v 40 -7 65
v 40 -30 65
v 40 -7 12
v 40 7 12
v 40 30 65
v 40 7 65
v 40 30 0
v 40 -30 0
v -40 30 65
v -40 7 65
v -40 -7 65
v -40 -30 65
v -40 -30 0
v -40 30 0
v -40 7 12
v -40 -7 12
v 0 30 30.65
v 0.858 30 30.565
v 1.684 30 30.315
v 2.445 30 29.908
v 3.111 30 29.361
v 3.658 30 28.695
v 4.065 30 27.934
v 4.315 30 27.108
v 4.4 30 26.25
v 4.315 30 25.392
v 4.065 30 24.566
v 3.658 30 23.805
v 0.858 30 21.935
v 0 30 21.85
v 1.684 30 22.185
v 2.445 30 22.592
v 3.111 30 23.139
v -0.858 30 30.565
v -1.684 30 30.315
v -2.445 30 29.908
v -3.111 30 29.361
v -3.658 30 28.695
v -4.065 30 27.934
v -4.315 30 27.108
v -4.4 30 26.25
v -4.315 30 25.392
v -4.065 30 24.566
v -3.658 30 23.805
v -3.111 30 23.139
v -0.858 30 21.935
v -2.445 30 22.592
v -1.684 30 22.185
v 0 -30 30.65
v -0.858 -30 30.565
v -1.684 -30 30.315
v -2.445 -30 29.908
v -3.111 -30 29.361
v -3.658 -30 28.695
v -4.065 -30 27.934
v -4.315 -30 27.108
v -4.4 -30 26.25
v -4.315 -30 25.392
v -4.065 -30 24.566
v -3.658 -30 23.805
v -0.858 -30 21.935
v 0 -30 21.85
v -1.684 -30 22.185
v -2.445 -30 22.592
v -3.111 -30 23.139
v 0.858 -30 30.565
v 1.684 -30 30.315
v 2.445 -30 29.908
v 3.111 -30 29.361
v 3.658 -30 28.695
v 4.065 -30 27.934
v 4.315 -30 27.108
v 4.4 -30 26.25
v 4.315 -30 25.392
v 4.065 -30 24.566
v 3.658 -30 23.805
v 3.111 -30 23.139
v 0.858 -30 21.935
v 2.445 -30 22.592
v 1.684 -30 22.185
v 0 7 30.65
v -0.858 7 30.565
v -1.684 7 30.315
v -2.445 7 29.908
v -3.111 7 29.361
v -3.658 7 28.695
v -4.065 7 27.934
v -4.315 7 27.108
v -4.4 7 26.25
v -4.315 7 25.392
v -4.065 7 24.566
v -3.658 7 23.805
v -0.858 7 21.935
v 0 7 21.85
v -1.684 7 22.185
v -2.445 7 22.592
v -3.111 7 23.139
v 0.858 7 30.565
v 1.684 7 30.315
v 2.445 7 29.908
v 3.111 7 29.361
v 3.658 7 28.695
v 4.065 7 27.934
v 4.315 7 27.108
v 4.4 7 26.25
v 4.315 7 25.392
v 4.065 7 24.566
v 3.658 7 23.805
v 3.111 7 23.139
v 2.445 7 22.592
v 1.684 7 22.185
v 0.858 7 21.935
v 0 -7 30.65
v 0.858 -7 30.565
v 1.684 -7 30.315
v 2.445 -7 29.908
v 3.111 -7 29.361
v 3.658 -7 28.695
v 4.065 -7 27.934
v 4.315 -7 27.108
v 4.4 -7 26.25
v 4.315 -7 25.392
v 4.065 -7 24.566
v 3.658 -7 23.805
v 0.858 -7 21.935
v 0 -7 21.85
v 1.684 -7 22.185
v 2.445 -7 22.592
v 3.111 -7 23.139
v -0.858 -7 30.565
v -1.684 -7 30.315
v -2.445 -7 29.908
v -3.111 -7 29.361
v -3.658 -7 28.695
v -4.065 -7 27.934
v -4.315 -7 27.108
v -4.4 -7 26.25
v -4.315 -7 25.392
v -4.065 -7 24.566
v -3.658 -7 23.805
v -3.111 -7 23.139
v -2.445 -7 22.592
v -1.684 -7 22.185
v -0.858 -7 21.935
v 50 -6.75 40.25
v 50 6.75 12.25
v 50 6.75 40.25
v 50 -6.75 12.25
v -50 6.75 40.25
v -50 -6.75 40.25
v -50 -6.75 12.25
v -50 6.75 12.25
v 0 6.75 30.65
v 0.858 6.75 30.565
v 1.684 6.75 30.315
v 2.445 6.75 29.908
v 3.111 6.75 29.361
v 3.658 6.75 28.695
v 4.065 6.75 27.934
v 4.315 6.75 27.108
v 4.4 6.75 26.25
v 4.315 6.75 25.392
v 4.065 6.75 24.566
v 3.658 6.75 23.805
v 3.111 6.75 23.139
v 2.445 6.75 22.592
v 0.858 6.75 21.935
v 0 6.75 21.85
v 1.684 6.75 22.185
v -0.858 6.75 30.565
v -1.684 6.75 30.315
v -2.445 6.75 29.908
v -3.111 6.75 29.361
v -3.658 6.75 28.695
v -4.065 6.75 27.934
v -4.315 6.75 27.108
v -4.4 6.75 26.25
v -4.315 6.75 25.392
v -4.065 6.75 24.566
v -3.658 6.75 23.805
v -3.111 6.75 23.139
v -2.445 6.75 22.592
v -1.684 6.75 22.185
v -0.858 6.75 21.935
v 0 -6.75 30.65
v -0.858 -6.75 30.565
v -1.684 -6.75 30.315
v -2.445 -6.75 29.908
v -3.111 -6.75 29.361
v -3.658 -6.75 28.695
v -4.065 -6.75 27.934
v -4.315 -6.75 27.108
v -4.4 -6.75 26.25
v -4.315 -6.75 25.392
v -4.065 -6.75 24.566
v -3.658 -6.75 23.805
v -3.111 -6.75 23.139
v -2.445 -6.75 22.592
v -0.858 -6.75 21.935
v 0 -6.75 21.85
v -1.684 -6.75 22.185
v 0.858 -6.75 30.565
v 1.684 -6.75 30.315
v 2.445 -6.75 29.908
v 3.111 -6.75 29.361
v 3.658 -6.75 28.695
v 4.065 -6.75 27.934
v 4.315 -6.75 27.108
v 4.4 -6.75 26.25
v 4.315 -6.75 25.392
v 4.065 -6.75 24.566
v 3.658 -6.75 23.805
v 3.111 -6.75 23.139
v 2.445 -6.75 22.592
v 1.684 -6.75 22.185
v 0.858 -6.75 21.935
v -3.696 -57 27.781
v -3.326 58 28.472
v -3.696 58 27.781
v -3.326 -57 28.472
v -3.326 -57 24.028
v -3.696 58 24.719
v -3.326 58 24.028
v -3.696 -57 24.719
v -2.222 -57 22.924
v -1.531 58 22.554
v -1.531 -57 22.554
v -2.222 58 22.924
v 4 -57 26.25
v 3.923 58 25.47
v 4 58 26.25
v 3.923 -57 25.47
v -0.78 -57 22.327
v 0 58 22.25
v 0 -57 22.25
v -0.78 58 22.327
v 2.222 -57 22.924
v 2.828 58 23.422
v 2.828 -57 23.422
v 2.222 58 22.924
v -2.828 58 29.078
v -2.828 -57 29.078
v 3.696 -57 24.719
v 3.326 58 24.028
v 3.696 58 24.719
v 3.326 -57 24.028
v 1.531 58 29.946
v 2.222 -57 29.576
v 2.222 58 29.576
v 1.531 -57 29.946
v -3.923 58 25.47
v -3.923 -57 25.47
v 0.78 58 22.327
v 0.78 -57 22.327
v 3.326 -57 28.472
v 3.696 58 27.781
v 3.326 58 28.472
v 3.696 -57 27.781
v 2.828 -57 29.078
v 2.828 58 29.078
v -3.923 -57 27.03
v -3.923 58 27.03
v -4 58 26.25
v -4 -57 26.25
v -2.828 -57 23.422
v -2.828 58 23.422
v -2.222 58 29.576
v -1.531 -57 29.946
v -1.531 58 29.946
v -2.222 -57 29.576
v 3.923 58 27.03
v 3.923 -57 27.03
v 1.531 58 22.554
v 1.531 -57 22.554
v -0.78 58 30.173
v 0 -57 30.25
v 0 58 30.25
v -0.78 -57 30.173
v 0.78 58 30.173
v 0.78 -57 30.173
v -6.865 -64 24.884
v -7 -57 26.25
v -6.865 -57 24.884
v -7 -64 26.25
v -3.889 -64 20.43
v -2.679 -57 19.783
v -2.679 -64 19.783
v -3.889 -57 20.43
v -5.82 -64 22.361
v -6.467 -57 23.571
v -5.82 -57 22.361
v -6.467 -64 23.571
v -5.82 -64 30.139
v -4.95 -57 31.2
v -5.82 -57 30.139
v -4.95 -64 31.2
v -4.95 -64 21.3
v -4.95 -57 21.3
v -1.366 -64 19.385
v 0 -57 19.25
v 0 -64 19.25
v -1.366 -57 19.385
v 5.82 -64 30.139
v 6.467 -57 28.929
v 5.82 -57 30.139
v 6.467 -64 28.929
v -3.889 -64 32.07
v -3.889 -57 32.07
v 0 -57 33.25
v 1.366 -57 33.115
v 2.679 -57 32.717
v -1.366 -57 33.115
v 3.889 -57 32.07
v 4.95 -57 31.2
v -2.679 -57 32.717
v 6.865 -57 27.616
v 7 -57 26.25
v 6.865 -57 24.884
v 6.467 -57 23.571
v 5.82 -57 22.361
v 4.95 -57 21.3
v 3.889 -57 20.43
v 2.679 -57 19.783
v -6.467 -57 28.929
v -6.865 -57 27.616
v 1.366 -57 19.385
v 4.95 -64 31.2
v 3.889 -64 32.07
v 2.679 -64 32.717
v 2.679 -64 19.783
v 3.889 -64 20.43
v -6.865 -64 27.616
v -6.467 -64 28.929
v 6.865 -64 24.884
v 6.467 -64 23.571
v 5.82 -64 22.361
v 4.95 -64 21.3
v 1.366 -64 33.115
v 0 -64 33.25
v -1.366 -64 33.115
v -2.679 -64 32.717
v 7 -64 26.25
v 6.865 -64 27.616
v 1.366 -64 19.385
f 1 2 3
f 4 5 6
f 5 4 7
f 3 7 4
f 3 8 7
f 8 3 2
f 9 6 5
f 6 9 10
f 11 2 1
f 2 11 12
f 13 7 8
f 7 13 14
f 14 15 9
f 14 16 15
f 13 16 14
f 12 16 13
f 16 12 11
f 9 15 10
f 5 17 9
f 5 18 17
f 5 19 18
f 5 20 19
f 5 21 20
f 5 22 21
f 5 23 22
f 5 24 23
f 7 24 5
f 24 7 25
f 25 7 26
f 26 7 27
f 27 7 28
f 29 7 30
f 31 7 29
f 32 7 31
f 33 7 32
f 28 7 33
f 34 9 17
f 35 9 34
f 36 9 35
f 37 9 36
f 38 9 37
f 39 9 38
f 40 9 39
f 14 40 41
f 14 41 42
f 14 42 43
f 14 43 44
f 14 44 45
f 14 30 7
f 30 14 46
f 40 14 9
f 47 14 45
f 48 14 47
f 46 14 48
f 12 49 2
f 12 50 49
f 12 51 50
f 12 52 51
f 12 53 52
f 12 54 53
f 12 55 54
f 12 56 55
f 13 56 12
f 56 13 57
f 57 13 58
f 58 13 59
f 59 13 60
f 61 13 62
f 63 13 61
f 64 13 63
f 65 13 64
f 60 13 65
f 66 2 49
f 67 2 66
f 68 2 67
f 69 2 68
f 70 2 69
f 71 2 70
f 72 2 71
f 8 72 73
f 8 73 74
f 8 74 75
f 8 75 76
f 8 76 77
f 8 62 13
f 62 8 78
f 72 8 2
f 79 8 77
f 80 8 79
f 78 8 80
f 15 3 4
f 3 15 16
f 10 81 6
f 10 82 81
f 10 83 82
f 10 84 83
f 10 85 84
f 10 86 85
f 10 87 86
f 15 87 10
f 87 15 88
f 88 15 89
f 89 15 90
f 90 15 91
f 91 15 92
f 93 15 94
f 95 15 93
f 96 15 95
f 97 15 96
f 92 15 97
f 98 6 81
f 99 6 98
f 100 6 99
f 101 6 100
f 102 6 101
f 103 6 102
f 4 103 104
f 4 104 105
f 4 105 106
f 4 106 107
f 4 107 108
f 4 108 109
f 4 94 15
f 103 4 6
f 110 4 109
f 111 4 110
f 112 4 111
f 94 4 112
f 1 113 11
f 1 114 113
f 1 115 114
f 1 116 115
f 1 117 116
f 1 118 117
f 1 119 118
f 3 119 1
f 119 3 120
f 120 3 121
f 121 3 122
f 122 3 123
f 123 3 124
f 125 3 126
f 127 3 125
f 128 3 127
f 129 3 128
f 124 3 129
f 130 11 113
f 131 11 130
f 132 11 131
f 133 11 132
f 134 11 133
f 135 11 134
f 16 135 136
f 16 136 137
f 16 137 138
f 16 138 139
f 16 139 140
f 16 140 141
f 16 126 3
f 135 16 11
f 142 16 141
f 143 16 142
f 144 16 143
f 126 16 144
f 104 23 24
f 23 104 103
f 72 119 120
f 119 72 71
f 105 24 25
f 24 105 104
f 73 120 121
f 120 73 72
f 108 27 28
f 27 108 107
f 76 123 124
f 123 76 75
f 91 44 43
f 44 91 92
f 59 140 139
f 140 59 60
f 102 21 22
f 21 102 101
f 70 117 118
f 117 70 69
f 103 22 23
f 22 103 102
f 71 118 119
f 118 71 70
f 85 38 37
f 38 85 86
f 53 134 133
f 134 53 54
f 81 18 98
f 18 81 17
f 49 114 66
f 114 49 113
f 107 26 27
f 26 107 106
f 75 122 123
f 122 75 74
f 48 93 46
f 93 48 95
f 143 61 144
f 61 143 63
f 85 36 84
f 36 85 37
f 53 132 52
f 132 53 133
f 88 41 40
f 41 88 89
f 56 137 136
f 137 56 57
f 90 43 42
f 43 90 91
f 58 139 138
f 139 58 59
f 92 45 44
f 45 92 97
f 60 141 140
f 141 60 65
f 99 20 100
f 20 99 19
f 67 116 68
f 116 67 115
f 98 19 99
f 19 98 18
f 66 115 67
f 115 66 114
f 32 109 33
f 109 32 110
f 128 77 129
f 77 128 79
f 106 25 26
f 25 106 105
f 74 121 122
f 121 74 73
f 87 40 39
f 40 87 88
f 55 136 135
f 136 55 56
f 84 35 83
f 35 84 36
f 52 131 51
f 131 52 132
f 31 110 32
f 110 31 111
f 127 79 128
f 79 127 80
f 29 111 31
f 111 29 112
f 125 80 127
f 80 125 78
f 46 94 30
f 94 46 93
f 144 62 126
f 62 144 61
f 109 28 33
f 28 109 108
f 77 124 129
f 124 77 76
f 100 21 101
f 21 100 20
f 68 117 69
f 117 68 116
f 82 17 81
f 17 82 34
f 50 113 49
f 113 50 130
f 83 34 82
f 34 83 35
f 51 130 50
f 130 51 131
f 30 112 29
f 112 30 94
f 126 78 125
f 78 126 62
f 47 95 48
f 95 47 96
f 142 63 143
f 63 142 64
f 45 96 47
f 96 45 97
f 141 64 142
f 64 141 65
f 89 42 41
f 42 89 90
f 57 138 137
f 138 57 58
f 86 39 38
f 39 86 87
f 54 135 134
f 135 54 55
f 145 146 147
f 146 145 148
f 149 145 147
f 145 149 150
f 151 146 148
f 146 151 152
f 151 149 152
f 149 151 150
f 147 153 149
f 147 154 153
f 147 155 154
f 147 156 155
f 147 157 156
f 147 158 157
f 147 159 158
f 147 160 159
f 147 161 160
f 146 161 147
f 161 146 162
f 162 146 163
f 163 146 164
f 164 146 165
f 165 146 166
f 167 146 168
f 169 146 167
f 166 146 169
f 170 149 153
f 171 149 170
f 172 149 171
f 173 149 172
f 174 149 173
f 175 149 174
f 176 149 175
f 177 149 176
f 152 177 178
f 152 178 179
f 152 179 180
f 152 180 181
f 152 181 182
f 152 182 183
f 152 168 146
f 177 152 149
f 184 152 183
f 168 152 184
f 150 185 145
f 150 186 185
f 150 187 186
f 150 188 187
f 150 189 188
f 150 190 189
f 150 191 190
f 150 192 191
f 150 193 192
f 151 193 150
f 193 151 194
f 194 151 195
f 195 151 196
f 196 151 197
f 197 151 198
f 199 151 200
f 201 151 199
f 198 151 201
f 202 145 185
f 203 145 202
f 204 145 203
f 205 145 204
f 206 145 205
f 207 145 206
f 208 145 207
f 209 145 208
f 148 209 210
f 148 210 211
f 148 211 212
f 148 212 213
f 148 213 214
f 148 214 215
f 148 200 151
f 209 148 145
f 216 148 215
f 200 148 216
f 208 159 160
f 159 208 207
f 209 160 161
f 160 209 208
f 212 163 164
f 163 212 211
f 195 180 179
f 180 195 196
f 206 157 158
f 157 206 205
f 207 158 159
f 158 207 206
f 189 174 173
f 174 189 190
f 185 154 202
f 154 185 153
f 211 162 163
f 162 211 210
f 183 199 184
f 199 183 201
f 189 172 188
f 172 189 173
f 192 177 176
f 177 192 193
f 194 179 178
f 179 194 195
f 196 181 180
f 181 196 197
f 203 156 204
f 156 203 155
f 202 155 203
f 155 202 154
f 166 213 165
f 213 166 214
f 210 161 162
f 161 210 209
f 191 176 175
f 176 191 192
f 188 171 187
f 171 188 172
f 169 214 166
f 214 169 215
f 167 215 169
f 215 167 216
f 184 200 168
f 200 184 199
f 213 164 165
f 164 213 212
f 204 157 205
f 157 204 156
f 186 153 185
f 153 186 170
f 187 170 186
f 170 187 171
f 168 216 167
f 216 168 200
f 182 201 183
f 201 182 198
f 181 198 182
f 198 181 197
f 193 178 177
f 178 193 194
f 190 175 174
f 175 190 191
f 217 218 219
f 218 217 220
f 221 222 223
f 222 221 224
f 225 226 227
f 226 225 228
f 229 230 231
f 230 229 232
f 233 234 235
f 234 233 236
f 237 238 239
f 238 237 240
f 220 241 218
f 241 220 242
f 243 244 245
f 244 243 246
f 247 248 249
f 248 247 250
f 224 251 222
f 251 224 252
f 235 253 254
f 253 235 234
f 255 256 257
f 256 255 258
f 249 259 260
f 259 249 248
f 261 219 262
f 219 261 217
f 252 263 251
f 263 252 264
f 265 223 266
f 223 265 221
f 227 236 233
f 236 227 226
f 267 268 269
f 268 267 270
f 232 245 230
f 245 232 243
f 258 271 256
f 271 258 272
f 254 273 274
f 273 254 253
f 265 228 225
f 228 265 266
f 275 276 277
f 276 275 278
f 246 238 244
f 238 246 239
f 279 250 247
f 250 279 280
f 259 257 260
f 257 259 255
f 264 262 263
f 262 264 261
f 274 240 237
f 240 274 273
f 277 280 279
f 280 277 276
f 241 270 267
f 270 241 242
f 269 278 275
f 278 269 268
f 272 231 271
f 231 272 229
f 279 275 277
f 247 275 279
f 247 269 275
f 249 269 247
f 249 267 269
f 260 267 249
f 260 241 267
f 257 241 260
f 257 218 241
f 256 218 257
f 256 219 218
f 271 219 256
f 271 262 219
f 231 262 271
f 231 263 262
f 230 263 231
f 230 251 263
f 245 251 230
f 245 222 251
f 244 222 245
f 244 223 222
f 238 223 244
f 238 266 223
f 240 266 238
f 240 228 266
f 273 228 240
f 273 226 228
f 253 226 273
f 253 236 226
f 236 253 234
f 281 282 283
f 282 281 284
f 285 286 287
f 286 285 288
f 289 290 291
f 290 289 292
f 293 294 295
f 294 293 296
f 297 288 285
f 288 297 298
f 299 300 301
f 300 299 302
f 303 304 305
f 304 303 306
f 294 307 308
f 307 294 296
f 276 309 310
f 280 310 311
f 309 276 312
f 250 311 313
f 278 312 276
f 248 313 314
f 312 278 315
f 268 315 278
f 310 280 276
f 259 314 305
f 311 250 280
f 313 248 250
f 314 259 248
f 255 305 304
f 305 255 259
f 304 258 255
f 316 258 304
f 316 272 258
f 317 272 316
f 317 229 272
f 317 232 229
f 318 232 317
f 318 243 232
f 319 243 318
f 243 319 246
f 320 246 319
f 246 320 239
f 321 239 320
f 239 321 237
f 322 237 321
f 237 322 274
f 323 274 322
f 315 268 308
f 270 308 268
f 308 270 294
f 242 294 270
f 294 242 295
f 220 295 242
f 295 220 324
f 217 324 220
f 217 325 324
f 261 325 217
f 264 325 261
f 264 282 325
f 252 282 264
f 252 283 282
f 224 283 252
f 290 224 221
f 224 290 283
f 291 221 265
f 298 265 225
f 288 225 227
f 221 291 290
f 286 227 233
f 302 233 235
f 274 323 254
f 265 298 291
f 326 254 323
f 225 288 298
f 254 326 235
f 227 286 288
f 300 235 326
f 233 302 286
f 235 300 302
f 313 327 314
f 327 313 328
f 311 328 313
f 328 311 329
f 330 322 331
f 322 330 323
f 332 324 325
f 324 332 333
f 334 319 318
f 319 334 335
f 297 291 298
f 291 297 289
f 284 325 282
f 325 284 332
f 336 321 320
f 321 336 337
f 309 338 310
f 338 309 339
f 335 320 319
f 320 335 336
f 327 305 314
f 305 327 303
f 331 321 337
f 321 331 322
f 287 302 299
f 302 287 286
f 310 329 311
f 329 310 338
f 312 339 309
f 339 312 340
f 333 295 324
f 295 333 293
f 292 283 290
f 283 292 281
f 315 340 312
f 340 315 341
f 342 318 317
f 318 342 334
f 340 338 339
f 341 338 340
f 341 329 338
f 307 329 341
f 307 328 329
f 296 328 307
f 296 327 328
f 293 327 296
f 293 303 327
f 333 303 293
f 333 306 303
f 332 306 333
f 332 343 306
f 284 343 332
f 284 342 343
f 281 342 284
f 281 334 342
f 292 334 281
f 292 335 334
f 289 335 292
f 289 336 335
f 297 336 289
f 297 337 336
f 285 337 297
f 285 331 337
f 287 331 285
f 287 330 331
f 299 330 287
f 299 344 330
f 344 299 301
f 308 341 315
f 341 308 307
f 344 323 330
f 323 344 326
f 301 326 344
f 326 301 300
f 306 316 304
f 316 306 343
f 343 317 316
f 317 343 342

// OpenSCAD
$fn = 32;

// ------------------------------------------------------------------------
// Clevis joint: 80 mm clevis, pin d8
// Every part is its own module, assembly() places them once.
// ------------------------------------------------------------------------

// --- part 1 ---
module clevis() {
  difference() {
    translate([-40, -30, 0]) cube([80, 60, 65]);
    translate([-41, -7, 12]) cube([82, 14, 54]);
    translate([0, 0, 26.25]) rotate([90, 0, 0]) cylinder(h = 62, d = 8.8, center = true);
  }
}

// --- part 2 ---
module eye() {
  difference() {
    translate([-50, -6.75, 0]) cube([100, 13.5, 28]);
    translate([0, 0, 14]) rotate([90, 0, 0]) cylinder(h = 15.5, d = 8.8, center = true);
  }
}

// --- part 3 ---
module pin() {
  rotate([0, 90, 0]) cylinder(h = 116, d = 8, center = true);
  translate([-64, 0, 0]) rotate([0, 90, 0]) cylinder(h = 7, d = 14);
}

// --- assembly ---
module assembly() {
  translate([0, 0, 0]) rotate([0, 0, 0]) clevis();
  translate([0, 0, 12.25]) rotate([0, 0, 0]) eye();
  translate([0, 0, 26.25]) rotate([0, 0, 90]) pin();
}

assembly();
